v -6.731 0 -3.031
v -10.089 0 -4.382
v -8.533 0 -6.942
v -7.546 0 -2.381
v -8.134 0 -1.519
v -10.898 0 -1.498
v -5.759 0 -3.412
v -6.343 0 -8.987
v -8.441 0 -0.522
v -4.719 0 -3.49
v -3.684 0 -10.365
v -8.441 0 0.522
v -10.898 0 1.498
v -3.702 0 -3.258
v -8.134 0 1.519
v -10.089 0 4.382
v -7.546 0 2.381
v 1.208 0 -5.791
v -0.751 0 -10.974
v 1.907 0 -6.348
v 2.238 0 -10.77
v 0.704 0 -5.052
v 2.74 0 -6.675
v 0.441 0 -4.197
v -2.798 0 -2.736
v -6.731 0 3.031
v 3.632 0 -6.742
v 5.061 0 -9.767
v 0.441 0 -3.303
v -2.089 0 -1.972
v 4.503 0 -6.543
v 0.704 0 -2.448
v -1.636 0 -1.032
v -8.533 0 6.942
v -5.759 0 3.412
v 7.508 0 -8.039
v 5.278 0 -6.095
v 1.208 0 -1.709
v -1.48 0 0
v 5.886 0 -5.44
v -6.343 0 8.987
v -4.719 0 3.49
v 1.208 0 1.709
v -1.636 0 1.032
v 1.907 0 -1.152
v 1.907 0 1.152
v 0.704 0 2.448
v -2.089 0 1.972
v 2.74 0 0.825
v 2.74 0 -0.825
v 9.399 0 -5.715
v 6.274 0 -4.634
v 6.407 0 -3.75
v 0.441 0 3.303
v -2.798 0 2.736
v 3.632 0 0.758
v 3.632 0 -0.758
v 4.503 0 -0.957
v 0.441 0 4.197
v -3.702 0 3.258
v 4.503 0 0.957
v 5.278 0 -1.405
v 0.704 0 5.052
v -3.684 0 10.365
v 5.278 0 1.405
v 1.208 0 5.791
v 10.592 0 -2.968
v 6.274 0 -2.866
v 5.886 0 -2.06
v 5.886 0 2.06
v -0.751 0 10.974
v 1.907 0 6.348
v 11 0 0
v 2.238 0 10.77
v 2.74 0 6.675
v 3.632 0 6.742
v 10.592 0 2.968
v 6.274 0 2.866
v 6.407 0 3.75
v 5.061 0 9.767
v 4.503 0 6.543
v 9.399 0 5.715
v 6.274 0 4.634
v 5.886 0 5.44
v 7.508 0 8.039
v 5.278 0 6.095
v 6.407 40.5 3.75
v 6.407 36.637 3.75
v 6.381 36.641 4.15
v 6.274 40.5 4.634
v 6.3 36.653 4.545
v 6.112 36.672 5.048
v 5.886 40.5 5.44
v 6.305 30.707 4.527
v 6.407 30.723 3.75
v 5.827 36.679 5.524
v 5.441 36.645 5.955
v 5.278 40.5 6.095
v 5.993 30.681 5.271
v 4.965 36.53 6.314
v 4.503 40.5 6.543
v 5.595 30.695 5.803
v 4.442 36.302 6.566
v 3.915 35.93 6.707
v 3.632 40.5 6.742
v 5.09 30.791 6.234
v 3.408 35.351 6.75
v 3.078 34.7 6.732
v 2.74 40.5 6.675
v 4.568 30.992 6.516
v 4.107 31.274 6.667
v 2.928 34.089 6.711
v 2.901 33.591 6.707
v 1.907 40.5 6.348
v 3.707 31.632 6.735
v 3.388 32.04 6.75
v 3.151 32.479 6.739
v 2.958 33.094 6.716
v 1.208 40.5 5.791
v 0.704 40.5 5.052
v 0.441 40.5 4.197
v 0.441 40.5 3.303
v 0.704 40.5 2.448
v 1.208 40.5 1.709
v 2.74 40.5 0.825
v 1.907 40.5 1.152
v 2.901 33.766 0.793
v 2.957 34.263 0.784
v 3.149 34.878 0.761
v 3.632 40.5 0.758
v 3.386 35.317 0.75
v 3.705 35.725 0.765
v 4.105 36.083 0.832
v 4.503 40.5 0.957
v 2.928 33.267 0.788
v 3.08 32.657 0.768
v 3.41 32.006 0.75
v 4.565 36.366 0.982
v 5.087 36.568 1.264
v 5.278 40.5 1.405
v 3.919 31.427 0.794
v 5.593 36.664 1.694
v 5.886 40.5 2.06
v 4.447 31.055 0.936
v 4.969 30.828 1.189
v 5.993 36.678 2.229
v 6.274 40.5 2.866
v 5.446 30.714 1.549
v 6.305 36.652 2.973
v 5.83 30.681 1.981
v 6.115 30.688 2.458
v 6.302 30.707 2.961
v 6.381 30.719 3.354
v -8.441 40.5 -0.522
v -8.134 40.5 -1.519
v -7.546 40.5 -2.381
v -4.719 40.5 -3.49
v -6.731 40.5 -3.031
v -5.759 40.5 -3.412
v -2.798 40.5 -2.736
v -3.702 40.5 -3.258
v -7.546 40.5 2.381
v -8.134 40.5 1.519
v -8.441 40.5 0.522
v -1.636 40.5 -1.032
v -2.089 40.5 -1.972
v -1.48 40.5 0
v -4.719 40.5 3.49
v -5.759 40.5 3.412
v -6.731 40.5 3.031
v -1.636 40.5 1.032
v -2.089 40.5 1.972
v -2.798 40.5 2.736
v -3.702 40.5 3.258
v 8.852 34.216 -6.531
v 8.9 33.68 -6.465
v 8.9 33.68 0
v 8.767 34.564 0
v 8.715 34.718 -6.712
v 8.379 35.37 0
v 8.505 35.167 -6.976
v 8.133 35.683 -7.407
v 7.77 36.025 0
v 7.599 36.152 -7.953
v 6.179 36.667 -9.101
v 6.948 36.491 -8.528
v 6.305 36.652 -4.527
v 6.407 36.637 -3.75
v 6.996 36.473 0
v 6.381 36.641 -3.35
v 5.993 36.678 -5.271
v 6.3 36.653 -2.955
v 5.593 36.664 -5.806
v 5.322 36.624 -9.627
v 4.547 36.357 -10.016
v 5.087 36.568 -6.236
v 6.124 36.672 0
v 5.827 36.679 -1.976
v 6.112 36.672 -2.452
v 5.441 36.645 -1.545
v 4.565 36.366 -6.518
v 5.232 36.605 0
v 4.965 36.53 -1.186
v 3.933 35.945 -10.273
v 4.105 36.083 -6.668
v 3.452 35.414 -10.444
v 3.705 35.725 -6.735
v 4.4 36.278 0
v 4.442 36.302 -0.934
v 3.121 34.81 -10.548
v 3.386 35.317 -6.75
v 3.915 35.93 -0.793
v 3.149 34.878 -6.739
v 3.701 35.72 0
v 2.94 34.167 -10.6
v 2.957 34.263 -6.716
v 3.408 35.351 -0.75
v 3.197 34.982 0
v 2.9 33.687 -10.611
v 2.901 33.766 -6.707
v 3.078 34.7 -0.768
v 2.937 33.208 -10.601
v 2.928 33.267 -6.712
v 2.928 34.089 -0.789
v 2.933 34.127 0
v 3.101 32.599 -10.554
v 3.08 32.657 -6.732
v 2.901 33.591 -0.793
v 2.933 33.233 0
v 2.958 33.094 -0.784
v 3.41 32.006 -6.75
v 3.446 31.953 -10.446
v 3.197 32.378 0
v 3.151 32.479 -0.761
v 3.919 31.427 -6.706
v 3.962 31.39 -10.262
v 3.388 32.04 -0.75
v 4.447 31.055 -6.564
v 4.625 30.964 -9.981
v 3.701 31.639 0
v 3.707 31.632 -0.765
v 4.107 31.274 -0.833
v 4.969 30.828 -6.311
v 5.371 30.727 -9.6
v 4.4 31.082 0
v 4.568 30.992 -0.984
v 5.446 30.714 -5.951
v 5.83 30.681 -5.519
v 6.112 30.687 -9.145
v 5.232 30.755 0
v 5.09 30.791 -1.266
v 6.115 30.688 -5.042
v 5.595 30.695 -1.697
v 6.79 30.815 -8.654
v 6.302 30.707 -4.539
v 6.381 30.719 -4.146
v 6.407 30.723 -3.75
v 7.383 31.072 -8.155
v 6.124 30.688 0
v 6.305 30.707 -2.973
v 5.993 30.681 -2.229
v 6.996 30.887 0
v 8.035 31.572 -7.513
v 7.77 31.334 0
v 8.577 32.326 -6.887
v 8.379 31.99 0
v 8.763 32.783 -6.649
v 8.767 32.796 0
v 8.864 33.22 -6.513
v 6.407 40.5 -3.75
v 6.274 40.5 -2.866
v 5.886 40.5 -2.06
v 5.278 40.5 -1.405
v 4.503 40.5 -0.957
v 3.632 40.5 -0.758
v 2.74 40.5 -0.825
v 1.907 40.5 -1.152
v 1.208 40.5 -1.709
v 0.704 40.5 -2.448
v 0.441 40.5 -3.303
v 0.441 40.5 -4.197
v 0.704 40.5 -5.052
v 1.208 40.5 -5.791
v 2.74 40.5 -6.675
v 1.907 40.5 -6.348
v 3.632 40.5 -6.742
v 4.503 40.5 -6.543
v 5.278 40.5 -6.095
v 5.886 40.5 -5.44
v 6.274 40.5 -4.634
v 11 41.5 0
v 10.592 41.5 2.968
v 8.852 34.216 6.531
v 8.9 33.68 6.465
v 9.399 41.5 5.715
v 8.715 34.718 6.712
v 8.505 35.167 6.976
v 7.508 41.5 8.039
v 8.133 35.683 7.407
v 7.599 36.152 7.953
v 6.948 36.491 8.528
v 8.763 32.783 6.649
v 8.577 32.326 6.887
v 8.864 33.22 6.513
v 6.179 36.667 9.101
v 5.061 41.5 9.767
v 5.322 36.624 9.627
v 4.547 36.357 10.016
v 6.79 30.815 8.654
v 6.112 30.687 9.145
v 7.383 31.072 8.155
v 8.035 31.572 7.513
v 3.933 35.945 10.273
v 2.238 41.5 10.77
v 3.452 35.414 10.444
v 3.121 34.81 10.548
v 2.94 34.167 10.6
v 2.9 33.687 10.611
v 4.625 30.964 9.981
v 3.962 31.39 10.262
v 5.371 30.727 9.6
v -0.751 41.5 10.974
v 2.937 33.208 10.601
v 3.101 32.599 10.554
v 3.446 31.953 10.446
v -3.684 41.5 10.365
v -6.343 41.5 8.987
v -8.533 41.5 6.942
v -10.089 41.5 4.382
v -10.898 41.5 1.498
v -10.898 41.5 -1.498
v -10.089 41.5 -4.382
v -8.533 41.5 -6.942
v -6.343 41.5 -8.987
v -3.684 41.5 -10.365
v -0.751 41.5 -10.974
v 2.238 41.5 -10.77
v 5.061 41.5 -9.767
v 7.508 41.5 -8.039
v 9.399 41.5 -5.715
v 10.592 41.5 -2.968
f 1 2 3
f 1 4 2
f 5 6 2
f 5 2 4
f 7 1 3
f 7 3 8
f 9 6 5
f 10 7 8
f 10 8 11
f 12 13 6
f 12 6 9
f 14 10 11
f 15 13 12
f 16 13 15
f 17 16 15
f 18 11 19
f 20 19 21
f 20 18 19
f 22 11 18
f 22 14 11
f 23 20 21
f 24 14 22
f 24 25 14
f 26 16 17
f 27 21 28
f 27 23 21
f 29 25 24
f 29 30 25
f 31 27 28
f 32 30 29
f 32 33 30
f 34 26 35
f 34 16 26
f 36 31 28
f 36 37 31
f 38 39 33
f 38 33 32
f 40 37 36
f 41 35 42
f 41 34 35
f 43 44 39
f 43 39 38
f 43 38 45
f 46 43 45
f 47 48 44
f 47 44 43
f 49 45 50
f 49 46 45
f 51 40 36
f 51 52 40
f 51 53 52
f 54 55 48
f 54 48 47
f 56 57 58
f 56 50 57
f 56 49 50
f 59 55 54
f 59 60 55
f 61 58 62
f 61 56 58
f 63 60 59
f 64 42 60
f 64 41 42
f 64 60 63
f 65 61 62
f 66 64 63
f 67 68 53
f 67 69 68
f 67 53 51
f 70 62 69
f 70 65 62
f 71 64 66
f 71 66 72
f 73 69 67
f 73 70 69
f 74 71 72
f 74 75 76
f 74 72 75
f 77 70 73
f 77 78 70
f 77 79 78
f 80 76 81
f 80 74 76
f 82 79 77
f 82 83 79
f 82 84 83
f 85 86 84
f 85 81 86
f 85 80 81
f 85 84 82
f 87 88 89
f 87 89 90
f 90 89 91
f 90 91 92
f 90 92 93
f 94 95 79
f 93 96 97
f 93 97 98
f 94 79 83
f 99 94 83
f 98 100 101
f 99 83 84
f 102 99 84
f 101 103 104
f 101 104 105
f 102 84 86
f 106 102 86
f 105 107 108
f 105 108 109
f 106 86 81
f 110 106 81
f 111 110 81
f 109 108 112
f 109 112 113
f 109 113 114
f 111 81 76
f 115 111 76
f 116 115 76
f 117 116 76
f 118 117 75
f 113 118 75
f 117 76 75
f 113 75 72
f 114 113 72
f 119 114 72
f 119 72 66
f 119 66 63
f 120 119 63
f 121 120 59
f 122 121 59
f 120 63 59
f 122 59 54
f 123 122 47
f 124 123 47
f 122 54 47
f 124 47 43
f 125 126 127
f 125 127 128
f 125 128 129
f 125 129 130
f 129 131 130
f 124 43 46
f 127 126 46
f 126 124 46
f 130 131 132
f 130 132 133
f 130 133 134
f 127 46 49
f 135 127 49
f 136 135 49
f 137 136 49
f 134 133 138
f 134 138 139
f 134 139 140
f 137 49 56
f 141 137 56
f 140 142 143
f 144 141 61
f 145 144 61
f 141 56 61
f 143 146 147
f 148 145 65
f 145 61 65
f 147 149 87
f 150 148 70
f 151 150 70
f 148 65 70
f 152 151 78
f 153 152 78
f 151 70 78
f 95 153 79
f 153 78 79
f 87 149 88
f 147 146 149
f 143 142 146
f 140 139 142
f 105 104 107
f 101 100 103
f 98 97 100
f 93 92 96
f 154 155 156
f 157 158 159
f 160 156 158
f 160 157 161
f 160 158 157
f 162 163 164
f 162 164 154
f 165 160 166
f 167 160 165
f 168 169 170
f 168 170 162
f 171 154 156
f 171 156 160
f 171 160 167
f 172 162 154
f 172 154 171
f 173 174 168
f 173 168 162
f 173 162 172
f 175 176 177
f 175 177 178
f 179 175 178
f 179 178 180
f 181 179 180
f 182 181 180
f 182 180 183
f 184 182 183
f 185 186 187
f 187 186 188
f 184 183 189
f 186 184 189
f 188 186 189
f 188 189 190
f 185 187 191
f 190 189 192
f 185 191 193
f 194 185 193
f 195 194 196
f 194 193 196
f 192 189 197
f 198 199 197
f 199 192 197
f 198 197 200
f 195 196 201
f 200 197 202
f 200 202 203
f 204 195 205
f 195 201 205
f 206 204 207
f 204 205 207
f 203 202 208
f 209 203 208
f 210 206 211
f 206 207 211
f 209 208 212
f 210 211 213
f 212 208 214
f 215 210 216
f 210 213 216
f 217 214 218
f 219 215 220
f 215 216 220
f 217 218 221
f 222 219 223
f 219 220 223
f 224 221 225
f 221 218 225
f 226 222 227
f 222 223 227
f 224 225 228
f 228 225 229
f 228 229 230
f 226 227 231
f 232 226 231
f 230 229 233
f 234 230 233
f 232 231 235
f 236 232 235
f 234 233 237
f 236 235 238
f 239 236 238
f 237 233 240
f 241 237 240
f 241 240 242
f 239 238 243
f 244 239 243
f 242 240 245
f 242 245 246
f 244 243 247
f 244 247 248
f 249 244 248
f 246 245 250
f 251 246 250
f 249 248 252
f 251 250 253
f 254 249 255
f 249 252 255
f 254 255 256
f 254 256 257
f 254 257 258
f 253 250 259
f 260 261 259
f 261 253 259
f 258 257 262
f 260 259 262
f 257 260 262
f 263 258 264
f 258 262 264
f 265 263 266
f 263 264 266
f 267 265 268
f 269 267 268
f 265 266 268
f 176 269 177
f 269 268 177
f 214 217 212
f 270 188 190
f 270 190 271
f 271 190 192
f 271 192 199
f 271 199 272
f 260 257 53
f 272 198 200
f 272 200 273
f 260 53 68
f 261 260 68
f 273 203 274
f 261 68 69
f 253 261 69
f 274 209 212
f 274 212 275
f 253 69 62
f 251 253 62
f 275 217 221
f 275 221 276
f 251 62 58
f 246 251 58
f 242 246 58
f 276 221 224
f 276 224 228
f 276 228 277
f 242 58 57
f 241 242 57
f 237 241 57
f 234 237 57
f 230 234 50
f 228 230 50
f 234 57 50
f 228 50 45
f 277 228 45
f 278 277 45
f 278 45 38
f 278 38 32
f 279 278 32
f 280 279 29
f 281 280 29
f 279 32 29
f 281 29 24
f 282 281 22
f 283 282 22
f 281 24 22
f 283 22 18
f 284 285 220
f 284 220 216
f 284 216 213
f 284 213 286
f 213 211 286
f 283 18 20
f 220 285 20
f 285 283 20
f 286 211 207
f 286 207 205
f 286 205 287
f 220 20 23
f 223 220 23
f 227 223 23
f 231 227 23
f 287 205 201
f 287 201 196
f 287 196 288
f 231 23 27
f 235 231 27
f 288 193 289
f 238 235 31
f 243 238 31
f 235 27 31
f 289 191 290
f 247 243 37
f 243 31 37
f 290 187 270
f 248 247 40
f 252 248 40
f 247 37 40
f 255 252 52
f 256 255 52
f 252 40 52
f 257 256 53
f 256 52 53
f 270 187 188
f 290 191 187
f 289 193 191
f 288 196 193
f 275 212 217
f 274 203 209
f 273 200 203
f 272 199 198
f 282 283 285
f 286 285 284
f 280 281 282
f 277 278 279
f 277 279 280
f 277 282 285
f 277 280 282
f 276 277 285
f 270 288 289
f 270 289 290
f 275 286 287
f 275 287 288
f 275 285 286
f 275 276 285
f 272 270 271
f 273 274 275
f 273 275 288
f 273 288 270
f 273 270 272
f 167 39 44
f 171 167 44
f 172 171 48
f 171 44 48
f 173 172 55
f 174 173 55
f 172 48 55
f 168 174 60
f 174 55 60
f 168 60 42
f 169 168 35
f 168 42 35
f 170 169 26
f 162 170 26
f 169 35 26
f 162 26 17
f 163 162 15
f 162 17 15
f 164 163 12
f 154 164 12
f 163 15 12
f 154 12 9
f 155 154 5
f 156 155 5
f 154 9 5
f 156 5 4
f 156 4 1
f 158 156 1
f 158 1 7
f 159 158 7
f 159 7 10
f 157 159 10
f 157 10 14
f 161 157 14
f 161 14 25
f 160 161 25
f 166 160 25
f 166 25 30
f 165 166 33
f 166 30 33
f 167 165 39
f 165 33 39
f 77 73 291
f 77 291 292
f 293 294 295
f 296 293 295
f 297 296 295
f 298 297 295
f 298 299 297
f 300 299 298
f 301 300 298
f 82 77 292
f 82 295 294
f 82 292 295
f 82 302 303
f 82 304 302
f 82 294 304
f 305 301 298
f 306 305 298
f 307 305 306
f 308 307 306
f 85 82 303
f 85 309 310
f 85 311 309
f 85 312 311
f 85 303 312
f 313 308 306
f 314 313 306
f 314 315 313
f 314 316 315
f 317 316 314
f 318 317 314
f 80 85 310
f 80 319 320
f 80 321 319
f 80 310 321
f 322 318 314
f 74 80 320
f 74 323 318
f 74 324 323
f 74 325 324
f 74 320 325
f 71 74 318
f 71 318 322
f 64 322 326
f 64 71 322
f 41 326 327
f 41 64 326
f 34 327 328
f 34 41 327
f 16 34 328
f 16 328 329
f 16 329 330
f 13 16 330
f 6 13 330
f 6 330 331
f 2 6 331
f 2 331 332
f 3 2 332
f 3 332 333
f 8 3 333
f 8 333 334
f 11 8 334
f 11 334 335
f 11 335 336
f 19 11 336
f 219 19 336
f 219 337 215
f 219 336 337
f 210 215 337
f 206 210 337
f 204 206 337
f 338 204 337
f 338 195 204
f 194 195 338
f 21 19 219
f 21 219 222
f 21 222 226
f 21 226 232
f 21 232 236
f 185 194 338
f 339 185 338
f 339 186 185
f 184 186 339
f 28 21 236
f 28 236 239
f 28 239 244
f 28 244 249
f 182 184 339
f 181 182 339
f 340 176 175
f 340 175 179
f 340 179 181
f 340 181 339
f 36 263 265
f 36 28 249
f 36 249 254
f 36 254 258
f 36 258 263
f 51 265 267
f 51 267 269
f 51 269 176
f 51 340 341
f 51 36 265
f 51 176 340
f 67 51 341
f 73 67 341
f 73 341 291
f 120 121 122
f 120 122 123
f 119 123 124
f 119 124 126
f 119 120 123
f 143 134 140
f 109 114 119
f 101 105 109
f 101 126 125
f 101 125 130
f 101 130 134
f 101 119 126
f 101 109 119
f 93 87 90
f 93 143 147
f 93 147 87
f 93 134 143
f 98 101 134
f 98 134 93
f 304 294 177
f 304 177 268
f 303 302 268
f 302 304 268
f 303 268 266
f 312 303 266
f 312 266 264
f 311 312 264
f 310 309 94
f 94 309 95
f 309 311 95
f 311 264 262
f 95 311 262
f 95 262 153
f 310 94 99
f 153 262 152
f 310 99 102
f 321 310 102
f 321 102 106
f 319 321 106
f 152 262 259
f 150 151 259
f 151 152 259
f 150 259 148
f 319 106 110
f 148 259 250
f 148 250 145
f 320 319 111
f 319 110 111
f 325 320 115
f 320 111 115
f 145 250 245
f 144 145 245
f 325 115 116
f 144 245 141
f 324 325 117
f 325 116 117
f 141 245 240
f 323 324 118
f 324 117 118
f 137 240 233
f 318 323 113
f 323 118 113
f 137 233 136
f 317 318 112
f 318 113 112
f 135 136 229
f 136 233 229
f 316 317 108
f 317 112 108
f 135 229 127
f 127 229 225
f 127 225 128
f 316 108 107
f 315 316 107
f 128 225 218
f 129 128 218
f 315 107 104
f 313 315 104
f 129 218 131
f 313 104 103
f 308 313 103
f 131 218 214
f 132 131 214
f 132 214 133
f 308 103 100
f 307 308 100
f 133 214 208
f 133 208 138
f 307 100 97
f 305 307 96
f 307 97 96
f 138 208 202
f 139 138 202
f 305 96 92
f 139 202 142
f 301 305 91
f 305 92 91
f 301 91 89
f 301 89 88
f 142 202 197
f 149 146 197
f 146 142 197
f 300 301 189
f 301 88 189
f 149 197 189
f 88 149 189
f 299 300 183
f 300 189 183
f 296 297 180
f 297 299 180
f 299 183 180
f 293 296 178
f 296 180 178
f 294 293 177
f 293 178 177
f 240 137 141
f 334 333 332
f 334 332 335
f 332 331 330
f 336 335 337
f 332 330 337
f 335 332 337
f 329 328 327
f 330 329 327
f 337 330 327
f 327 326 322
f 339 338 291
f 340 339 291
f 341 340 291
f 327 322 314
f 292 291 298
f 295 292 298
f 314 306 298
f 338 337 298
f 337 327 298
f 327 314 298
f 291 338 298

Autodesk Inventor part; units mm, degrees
ref_plane "YZ Plane" through (0, 0, 0) normal (1, 0, 0) x (0, 1, 0)
ref_plane "XZ Plane" through (0, 0, 0) normal (0, 1, 0) x (-1, 0, 0)
sketch "Boceto1" plane through (0, 0, 0) normal (0, 1, 0) x (-1, 0, 0)
  circle A0 centre (0, 0) radius 10.95
  dimension "d0" = 21.9
extrude "Extrusión1" add sketch "Boceto1" along normal blind 146.5
sketch "Boceto2" plane through (0, 0, 0) normal (0, -1, 0) x (1, 0, 0)
  circle A0 centre (3.4074, 3.75) radius 3
  circle A1 centre (3.4074, -3.75) radius 3
  circle A2 centre (-4.9805, 0) radius 3.5
  point P0 (0, 0)
  dimension "d3" = 6
  dimension "d4" = 6
  dimension "d5" = 7
  dimension "d" = 7.5
  dimension "d7" = 3.75
extrude "Extrusión2" cut sketch "Boceto2" against normal blind 40.5
sketch "Boceto4" plane through (0, 0, 0) normal (0, -1, 0) x (1, 0, 0)
  circle A0 centre (0, 0) radius 10.95
  circle A1 centre (0, 0) radius 11
  dimension "d10" = 22
extrude "Extrusión3" add sketch "Boceto4" against normal blind 41.5
sketch "Boceto5" plane through (0, 146.5, 0) normal (0, 1, 0) x (1, 0, 0)
  circle A0 centre (0, 0) radius 10.95
extrude "Extrusión4" cut sketch "Boceto5" against normal blind 105
ref_plane "Plano de trabajo1" through (0, 0, 0) normal (0, 0, 1) x (1, 0, 0)
sketch "Boceto6" plane through (0, 0, 0) normal (0, 0, 1) x (1, 0, 0)
  circle A0 centre (5.8998, 33.6799) radius 3
  point P0 (0, 0)
  dimension "d16" = 6
extrude "Extrusión5" cut sketch "Boceto6" along normal mid plane 22
equation "\"d7\" = 0.5 * d"
properties part number "W520inferior"
